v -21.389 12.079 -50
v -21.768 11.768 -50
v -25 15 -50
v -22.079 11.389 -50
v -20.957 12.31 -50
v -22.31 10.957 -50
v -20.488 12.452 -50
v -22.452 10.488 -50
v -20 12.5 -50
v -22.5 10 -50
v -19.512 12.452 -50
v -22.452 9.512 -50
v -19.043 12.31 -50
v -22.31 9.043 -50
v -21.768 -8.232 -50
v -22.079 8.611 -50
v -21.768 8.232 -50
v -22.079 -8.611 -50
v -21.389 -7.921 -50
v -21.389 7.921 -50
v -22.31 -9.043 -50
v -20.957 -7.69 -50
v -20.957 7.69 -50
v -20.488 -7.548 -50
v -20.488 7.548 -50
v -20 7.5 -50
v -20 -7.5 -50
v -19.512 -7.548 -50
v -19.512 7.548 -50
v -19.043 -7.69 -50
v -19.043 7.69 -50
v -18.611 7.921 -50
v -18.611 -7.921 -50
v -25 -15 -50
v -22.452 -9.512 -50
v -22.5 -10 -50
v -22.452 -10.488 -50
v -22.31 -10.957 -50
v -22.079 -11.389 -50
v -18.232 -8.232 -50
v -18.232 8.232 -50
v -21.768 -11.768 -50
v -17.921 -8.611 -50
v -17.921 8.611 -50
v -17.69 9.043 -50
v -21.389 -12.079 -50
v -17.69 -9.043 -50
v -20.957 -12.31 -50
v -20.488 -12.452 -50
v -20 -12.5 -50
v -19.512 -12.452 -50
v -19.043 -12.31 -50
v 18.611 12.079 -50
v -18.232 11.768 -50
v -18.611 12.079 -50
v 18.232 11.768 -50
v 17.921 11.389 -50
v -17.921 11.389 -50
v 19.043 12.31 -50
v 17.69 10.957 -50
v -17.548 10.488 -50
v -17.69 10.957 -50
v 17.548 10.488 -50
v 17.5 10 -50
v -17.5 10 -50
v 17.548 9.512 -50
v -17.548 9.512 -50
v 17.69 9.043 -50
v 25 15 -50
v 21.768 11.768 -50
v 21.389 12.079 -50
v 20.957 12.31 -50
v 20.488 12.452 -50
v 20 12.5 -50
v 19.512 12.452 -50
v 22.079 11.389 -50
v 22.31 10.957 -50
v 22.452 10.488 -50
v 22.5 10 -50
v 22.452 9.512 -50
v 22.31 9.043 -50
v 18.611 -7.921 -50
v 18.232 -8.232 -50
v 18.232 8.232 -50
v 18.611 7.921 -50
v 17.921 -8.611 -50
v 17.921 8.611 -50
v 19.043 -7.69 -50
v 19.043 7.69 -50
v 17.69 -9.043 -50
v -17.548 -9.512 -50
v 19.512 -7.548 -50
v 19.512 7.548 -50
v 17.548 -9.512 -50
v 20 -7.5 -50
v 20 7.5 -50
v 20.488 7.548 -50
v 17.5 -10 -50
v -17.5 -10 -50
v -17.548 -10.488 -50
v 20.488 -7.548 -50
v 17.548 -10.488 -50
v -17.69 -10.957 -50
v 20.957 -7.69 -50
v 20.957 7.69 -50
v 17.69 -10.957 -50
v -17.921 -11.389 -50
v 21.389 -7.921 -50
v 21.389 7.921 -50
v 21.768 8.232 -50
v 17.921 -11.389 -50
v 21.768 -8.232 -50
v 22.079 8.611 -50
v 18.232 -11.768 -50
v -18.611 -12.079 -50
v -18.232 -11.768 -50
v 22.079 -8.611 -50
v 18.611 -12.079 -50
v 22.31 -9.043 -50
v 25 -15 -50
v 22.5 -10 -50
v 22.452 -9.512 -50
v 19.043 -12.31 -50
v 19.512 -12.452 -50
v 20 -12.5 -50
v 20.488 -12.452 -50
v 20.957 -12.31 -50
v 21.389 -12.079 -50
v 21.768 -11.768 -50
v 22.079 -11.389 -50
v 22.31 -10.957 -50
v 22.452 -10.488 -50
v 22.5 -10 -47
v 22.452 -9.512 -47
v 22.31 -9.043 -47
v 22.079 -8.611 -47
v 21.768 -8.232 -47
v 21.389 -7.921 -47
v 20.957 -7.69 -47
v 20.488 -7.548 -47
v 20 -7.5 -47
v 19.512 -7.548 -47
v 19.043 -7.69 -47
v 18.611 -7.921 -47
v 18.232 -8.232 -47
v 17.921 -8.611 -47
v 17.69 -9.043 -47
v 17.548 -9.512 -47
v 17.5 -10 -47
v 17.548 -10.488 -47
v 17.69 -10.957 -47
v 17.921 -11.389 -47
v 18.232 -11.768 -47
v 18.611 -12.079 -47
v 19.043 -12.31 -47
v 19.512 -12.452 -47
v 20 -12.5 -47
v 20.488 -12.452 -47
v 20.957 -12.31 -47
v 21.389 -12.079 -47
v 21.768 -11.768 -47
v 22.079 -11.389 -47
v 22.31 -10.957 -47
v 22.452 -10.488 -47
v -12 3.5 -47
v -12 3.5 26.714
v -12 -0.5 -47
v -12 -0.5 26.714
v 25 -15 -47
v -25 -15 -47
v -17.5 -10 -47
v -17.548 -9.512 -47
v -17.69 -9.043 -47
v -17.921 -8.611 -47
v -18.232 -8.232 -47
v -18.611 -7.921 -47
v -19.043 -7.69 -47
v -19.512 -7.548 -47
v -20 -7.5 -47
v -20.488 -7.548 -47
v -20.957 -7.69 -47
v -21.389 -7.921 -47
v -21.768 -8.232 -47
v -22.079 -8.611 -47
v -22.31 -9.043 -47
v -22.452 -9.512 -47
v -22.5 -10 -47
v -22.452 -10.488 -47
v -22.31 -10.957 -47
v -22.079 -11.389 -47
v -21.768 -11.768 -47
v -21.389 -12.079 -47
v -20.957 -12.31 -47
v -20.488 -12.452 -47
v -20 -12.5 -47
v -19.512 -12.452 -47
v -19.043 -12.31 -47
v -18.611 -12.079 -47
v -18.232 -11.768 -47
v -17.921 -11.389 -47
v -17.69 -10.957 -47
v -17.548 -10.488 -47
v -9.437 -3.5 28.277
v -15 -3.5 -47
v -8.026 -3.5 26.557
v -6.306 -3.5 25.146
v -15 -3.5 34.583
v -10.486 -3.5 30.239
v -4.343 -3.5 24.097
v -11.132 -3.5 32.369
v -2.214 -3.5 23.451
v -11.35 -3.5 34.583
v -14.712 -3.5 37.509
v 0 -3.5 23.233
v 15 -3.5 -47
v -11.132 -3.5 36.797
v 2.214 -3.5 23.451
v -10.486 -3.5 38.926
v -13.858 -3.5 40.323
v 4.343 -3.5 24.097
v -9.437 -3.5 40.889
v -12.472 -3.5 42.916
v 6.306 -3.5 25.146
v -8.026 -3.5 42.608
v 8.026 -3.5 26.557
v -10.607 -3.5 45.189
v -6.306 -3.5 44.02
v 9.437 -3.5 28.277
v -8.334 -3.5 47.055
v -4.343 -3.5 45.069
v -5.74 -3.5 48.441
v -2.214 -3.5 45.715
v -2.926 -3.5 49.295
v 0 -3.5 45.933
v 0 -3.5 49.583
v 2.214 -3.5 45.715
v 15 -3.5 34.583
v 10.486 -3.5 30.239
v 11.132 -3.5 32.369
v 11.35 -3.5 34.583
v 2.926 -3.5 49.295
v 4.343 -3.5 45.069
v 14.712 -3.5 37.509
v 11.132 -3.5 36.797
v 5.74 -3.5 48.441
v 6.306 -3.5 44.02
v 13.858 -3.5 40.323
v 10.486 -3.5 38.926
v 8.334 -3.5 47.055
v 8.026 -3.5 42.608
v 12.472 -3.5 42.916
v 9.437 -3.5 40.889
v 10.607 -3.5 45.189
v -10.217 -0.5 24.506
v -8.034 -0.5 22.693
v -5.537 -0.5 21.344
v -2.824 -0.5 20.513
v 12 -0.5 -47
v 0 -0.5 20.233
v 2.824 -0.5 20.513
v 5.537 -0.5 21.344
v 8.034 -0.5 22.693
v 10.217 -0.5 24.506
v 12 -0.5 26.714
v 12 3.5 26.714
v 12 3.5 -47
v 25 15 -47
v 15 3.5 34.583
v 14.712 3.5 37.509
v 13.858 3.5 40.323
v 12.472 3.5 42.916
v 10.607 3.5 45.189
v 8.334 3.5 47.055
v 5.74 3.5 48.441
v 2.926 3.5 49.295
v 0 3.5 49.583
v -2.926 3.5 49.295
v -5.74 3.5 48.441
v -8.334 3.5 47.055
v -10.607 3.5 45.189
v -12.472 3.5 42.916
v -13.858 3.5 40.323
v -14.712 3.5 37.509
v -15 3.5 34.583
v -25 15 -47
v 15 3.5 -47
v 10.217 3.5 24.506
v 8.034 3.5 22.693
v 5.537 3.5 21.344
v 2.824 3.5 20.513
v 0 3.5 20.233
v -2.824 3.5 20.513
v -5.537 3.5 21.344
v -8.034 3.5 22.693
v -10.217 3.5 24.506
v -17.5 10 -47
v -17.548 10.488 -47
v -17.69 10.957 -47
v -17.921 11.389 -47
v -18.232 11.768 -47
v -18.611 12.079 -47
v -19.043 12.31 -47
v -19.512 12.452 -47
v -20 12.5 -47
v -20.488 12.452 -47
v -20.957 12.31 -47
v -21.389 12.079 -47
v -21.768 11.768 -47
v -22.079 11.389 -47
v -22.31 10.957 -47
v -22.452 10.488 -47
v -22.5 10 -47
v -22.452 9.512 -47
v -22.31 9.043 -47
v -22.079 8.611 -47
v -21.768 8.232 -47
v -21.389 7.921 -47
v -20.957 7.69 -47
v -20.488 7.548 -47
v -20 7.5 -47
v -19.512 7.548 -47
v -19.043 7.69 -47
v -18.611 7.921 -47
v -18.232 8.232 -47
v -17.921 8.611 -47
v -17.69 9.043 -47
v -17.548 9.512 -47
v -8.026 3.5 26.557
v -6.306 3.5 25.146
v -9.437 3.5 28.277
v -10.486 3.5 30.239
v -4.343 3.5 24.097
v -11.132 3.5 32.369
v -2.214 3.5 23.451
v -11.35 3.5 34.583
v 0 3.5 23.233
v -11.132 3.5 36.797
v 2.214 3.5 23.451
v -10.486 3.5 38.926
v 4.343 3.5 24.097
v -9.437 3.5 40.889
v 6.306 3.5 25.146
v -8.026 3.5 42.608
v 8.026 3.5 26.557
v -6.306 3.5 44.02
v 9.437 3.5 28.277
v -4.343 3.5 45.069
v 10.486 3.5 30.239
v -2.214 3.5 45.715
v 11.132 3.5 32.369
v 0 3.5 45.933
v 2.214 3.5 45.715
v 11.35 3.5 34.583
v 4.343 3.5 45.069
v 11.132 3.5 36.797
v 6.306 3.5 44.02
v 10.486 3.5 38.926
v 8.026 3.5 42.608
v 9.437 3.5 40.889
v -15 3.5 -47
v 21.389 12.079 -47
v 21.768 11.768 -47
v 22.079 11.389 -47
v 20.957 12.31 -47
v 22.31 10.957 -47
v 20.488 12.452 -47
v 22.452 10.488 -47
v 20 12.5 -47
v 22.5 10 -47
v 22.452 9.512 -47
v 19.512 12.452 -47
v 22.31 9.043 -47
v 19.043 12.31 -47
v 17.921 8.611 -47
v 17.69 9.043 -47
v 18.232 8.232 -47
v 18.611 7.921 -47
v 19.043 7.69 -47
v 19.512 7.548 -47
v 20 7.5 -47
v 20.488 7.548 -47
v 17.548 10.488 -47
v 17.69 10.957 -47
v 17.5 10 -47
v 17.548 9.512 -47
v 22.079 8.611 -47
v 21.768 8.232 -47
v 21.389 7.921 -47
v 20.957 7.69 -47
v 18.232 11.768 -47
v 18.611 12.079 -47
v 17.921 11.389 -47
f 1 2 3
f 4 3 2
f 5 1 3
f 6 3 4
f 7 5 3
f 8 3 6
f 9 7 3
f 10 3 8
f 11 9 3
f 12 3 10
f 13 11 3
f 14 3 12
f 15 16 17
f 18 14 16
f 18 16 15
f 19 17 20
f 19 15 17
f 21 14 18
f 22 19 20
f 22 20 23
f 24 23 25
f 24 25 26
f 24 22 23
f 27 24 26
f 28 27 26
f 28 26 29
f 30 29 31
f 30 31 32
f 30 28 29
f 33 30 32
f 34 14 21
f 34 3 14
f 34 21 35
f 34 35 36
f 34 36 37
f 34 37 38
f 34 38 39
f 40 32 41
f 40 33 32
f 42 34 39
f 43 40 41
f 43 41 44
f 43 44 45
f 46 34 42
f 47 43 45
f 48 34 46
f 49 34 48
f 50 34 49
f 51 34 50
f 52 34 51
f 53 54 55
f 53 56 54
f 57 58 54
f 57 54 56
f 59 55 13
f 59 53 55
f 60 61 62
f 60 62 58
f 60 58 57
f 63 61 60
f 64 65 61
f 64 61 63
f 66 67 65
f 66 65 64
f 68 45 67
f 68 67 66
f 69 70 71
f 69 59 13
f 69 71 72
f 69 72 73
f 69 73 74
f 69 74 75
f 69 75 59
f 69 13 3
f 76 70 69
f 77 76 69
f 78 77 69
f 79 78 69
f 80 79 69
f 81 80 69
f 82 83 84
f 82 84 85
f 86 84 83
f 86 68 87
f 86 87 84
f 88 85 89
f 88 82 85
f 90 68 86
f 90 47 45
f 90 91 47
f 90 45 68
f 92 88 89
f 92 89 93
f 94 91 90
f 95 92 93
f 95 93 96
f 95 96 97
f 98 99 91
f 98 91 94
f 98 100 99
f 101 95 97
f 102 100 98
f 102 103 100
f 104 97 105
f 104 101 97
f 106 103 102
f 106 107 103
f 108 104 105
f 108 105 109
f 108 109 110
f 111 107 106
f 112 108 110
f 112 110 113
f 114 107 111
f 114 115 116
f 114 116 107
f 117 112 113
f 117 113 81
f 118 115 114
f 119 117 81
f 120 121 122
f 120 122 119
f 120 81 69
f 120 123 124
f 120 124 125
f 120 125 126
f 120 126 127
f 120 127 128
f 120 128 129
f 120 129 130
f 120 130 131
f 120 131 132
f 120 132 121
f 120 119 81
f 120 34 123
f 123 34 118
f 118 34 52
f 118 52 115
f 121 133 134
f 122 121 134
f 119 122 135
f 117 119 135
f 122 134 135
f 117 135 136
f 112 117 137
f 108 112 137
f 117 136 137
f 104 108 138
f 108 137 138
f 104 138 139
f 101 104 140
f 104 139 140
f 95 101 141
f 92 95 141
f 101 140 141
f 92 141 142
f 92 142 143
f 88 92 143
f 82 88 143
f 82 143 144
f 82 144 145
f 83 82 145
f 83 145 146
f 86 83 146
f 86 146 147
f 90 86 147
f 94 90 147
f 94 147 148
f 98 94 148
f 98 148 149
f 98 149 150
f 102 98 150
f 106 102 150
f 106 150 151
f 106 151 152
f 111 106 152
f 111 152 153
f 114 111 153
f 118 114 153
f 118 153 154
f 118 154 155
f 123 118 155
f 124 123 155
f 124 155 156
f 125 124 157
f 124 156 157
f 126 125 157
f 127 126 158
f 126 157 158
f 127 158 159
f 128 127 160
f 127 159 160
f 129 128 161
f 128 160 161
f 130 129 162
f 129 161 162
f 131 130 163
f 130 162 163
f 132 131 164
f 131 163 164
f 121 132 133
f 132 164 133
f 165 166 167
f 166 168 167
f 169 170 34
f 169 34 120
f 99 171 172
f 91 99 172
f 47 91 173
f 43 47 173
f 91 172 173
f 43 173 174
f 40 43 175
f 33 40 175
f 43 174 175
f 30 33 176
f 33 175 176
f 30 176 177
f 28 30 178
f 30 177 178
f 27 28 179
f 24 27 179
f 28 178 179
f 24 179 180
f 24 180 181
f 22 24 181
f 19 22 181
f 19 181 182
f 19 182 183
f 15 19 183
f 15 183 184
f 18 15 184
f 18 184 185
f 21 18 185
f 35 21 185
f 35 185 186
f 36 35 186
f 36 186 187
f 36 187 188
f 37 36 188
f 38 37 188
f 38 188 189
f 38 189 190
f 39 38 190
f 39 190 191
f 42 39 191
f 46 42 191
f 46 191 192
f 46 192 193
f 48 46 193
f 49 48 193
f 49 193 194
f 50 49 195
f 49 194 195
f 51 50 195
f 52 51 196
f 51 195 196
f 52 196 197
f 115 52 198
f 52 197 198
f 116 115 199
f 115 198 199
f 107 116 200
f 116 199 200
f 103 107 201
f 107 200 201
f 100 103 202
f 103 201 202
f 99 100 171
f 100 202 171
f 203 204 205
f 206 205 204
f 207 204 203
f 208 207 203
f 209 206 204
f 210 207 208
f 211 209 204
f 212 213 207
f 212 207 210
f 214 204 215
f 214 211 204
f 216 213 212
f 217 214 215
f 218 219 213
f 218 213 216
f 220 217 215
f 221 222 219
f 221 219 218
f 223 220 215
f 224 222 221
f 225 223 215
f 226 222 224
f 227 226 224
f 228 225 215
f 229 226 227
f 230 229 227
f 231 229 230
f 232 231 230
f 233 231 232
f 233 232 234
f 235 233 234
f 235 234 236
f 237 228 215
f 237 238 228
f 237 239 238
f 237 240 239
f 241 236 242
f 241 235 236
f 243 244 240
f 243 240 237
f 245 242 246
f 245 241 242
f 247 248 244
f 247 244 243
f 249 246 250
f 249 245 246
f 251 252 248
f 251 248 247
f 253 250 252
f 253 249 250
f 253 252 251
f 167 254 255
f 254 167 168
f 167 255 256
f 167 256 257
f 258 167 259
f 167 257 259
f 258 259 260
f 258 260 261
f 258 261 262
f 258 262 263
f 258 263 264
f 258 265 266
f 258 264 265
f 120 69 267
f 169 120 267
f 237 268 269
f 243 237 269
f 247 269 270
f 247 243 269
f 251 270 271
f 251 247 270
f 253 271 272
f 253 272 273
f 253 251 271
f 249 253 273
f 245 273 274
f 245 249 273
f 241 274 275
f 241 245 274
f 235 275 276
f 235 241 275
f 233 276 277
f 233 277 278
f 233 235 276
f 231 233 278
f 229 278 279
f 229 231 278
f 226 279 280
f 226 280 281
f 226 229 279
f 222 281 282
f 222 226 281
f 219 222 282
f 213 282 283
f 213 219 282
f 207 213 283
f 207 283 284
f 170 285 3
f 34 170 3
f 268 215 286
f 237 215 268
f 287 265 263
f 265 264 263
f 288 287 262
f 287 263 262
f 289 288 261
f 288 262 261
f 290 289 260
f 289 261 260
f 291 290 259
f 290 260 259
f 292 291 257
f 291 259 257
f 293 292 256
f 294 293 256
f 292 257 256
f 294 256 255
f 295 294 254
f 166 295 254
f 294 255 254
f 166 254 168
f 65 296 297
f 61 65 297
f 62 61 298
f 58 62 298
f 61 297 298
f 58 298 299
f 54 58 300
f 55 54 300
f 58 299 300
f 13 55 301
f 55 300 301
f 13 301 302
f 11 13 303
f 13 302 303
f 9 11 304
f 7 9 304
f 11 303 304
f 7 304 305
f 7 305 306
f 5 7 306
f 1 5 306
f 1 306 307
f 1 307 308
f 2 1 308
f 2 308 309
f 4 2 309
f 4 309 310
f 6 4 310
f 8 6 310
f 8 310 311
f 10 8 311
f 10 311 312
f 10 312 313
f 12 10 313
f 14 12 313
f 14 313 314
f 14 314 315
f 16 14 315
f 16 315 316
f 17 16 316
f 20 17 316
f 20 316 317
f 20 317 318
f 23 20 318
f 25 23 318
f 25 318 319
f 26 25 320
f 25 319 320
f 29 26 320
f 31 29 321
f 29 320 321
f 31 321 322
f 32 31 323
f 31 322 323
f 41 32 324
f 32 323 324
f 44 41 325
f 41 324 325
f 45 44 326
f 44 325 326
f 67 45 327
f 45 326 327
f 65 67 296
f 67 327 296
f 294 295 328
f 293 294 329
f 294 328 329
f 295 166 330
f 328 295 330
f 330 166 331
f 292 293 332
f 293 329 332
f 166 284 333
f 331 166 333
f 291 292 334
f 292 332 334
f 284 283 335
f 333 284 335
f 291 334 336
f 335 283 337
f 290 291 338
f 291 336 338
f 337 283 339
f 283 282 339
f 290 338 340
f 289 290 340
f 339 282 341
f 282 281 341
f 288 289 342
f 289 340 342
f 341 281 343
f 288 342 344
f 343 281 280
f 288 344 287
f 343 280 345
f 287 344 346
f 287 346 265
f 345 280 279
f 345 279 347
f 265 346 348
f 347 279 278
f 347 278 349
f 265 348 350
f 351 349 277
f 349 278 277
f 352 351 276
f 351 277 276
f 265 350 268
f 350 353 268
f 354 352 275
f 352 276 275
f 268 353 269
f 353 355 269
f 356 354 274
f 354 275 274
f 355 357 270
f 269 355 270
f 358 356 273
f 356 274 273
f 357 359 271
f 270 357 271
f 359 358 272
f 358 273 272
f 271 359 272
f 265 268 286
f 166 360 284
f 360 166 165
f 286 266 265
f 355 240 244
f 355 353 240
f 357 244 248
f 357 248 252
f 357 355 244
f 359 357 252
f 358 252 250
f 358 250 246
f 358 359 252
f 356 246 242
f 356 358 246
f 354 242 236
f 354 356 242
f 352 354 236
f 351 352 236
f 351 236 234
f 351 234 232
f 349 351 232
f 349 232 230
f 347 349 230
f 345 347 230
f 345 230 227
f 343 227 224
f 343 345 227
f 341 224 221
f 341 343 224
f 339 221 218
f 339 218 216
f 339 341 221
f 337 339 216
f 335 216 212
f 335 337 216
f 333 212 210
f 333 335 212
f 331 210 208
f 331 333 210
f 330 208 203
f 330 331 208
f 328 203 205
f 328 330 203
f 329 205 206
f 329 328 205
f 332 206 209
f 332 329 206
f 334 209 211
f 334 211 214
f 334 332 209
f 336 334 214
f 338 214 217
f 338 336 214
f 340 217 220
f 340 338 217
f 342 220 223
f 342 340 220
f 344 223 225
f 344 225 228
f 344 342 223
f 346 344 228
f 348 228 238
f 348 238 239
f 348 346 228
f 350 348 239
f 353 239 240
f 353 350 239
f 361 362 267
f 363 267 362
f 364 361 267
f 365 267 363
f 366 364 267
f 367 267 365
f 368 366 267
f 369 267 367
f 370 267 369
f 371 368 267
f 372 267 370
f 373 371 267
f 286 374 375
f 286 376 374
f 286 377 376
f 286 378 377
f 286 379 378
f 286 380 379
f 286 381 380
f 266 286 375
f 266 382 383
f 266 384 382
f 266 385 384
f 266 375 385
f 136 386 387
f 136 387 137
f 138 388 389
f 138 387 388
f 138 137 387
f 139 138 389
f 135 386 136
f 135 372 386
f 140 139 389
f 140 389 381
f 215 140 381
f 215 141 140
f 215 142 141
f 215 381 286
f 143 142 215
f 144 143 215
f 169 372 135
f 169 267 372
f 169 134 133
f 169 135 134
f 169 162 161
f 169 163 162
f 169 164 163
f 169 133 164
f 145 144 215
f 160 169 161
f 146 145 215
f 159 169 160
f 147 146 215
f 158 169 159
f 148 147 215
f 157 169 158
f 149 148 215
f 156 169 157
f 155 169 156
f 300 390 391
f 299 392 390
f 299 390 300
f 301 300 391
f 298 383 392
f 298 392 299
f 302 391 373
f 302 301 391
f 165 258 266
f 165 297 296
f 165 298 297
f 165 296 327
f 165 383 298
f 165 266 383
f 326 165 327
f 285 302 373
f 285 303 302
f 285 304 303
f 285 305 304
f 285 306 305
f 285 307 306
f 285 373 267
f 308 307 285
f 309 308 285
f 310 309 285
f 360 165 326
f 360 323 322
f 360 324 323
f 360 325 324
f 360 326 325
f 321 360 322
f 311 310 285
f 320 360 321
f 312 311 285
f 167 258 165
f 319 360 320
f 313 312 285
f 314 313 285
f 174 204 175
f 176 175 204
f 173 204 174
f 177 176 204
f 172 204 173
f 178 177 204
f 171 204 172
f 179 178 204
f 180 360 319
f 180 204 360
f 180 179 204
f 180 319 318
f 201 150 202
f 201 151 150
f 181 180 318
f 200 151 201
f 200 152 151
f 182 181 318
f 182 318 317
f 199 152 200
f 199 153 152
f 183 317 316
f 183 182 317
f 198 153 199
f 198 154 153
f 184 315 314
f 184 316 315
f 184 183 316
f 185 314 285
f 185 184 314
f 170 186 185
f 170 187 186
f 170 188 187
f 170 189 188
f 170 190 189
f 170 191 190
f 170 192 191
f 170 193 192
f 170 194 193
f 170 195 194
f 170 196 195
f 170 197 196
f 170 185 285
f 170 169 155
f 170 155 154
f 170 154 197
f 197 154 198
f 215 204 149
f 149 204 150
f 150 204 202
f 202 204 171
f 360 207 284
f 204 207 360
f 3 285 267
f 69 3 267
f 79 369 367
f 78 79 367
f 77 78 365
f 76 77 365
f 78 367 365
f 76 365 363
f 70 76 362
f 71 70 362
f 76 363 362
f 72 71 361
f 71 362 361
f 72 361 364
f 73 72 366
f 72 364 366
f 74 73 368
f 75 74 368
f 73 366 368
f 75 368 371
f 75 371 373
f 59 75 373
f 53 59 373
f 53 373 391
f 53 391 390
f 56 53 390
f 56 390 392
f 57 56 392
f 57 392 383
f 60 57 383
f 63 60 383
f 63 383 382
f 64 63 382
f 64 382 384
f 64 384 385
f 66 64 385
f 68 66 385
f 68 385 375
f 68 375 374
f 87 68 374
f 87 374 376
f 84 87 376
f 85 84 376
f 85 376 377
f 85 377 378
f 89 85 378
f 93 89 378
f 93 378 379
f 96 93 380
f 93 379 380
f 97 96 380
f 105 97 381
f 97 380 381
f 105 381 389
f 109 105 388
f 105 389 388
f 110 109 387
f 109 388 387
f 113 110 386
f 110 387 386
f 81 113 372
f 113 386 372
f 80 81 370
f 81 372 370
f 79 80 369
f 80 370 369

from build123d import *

# Parameters (mm, degrees)
F0_W     = 15
F0_H     = 47
F0_R     = 11.35
F1_DEPTH = 3.5
F2_DEPTH = 15
F3_T     = -3
F4_R     = 2.5
F5_DEPTH = 56


# Not quite as in the source:
# - a shell that OpenCascade refuses in one call is made with other operations: the cavity is built on its own and cut out


with BuildPart() as f1:
    # F0 (on Front) → F1 (new body, symmetric)
    with BuildSketch(Plane.XZ):
        with Locations((7.5, -23.5)):
            Rectangle(F0_W, F0_H)
        with BuildLine():
            Line((0, 0), (15, 0))
            Line((15, 0), (15, 34.5828086023))
            ThreePointArc((15, 34.5828086023), (10.6066017178, 23.9762068845), (0, 19.5828086023))
            Line((0, 19.5828086023), (0, 0))
        make_face()
        with BuildLine():
            ThreePointArc((15, 34.5828086023), (0, 49.5828086023), (-15, 34.5828086023))
            ThreePointArc((-15, 34.5828086023), (-10.6066017178, 23.9762068845), (0, 19.5828086023))
            ThreePointArc((0, 19.5828086023), (10.6066017178, 23.9762068845), (15, 34.5828086023))
        make_face()
        with Locations((0, 34.5828086023)):
            Circle(F0_R, mode=Mode.SUBTRACT)
        with BuildLine():
            Line((-15, 34.5828086023), (-15, 0))
            Line((-15, 0), (0, 0))
            Line((0, 0), (0, 19.5828086023))
            ThreePointArc((0, 19.5828086023), (-10.6066017178, 23.9762068845), (-15, 34.5828086023))
        make_face()
        with Locations((-7.5, -23.5)):
            Rectangle(F0_W, F0_H)
    extrude(amount=F1_DEPTH, both=True)

    # F0 (on Front) → F2 (join, symmetric)
    with BuildSketch(Plane.XZ):
        Polygon((-25, -47), (-25, -50), (25, -50), (25, -47), (15, -47), (0, -47), (-15, -47), align=None)
    extrude(amount=F2_DEPTH, both=True)

    # F3: a shell. OpenCascade refuses it in one call, so the cavity is built on its own and cut out:
    # the body offset inwards by the wall thickness, plus a prism from it out through each open face.
    f3_core = offset(f1.part, amount=F3_T, kind=Kind.INTERSECTION, mode=Mode.PRIVATE)
    f3_exits = [f3_core.faces().sort_by_distance(p)[0] for p in [
        (0, 0.5, -12.400343),
    ]]
    add(f3_core, mode=Mode.SUBTRACT)
    extrude(f3_exits, amount=-F3_T, mode=Mode.SUBTRACT)

    # F4 (on Top) → F5 (cut)
    with BuildSketch(Plane.XY):
        with Locations((20, 10)):
            Circle(F4_R)
        with Locations((-20, 10)):
            Circle(F4_R)
        with Locations((-20, -10)):
            Circle(F4_R)
        with Locations((20, -10)):
            Circle(F4_R)
    extrude(amount=-F5_DEPTH, mode=Mode.SUBTRACT)


solid = f1.part
